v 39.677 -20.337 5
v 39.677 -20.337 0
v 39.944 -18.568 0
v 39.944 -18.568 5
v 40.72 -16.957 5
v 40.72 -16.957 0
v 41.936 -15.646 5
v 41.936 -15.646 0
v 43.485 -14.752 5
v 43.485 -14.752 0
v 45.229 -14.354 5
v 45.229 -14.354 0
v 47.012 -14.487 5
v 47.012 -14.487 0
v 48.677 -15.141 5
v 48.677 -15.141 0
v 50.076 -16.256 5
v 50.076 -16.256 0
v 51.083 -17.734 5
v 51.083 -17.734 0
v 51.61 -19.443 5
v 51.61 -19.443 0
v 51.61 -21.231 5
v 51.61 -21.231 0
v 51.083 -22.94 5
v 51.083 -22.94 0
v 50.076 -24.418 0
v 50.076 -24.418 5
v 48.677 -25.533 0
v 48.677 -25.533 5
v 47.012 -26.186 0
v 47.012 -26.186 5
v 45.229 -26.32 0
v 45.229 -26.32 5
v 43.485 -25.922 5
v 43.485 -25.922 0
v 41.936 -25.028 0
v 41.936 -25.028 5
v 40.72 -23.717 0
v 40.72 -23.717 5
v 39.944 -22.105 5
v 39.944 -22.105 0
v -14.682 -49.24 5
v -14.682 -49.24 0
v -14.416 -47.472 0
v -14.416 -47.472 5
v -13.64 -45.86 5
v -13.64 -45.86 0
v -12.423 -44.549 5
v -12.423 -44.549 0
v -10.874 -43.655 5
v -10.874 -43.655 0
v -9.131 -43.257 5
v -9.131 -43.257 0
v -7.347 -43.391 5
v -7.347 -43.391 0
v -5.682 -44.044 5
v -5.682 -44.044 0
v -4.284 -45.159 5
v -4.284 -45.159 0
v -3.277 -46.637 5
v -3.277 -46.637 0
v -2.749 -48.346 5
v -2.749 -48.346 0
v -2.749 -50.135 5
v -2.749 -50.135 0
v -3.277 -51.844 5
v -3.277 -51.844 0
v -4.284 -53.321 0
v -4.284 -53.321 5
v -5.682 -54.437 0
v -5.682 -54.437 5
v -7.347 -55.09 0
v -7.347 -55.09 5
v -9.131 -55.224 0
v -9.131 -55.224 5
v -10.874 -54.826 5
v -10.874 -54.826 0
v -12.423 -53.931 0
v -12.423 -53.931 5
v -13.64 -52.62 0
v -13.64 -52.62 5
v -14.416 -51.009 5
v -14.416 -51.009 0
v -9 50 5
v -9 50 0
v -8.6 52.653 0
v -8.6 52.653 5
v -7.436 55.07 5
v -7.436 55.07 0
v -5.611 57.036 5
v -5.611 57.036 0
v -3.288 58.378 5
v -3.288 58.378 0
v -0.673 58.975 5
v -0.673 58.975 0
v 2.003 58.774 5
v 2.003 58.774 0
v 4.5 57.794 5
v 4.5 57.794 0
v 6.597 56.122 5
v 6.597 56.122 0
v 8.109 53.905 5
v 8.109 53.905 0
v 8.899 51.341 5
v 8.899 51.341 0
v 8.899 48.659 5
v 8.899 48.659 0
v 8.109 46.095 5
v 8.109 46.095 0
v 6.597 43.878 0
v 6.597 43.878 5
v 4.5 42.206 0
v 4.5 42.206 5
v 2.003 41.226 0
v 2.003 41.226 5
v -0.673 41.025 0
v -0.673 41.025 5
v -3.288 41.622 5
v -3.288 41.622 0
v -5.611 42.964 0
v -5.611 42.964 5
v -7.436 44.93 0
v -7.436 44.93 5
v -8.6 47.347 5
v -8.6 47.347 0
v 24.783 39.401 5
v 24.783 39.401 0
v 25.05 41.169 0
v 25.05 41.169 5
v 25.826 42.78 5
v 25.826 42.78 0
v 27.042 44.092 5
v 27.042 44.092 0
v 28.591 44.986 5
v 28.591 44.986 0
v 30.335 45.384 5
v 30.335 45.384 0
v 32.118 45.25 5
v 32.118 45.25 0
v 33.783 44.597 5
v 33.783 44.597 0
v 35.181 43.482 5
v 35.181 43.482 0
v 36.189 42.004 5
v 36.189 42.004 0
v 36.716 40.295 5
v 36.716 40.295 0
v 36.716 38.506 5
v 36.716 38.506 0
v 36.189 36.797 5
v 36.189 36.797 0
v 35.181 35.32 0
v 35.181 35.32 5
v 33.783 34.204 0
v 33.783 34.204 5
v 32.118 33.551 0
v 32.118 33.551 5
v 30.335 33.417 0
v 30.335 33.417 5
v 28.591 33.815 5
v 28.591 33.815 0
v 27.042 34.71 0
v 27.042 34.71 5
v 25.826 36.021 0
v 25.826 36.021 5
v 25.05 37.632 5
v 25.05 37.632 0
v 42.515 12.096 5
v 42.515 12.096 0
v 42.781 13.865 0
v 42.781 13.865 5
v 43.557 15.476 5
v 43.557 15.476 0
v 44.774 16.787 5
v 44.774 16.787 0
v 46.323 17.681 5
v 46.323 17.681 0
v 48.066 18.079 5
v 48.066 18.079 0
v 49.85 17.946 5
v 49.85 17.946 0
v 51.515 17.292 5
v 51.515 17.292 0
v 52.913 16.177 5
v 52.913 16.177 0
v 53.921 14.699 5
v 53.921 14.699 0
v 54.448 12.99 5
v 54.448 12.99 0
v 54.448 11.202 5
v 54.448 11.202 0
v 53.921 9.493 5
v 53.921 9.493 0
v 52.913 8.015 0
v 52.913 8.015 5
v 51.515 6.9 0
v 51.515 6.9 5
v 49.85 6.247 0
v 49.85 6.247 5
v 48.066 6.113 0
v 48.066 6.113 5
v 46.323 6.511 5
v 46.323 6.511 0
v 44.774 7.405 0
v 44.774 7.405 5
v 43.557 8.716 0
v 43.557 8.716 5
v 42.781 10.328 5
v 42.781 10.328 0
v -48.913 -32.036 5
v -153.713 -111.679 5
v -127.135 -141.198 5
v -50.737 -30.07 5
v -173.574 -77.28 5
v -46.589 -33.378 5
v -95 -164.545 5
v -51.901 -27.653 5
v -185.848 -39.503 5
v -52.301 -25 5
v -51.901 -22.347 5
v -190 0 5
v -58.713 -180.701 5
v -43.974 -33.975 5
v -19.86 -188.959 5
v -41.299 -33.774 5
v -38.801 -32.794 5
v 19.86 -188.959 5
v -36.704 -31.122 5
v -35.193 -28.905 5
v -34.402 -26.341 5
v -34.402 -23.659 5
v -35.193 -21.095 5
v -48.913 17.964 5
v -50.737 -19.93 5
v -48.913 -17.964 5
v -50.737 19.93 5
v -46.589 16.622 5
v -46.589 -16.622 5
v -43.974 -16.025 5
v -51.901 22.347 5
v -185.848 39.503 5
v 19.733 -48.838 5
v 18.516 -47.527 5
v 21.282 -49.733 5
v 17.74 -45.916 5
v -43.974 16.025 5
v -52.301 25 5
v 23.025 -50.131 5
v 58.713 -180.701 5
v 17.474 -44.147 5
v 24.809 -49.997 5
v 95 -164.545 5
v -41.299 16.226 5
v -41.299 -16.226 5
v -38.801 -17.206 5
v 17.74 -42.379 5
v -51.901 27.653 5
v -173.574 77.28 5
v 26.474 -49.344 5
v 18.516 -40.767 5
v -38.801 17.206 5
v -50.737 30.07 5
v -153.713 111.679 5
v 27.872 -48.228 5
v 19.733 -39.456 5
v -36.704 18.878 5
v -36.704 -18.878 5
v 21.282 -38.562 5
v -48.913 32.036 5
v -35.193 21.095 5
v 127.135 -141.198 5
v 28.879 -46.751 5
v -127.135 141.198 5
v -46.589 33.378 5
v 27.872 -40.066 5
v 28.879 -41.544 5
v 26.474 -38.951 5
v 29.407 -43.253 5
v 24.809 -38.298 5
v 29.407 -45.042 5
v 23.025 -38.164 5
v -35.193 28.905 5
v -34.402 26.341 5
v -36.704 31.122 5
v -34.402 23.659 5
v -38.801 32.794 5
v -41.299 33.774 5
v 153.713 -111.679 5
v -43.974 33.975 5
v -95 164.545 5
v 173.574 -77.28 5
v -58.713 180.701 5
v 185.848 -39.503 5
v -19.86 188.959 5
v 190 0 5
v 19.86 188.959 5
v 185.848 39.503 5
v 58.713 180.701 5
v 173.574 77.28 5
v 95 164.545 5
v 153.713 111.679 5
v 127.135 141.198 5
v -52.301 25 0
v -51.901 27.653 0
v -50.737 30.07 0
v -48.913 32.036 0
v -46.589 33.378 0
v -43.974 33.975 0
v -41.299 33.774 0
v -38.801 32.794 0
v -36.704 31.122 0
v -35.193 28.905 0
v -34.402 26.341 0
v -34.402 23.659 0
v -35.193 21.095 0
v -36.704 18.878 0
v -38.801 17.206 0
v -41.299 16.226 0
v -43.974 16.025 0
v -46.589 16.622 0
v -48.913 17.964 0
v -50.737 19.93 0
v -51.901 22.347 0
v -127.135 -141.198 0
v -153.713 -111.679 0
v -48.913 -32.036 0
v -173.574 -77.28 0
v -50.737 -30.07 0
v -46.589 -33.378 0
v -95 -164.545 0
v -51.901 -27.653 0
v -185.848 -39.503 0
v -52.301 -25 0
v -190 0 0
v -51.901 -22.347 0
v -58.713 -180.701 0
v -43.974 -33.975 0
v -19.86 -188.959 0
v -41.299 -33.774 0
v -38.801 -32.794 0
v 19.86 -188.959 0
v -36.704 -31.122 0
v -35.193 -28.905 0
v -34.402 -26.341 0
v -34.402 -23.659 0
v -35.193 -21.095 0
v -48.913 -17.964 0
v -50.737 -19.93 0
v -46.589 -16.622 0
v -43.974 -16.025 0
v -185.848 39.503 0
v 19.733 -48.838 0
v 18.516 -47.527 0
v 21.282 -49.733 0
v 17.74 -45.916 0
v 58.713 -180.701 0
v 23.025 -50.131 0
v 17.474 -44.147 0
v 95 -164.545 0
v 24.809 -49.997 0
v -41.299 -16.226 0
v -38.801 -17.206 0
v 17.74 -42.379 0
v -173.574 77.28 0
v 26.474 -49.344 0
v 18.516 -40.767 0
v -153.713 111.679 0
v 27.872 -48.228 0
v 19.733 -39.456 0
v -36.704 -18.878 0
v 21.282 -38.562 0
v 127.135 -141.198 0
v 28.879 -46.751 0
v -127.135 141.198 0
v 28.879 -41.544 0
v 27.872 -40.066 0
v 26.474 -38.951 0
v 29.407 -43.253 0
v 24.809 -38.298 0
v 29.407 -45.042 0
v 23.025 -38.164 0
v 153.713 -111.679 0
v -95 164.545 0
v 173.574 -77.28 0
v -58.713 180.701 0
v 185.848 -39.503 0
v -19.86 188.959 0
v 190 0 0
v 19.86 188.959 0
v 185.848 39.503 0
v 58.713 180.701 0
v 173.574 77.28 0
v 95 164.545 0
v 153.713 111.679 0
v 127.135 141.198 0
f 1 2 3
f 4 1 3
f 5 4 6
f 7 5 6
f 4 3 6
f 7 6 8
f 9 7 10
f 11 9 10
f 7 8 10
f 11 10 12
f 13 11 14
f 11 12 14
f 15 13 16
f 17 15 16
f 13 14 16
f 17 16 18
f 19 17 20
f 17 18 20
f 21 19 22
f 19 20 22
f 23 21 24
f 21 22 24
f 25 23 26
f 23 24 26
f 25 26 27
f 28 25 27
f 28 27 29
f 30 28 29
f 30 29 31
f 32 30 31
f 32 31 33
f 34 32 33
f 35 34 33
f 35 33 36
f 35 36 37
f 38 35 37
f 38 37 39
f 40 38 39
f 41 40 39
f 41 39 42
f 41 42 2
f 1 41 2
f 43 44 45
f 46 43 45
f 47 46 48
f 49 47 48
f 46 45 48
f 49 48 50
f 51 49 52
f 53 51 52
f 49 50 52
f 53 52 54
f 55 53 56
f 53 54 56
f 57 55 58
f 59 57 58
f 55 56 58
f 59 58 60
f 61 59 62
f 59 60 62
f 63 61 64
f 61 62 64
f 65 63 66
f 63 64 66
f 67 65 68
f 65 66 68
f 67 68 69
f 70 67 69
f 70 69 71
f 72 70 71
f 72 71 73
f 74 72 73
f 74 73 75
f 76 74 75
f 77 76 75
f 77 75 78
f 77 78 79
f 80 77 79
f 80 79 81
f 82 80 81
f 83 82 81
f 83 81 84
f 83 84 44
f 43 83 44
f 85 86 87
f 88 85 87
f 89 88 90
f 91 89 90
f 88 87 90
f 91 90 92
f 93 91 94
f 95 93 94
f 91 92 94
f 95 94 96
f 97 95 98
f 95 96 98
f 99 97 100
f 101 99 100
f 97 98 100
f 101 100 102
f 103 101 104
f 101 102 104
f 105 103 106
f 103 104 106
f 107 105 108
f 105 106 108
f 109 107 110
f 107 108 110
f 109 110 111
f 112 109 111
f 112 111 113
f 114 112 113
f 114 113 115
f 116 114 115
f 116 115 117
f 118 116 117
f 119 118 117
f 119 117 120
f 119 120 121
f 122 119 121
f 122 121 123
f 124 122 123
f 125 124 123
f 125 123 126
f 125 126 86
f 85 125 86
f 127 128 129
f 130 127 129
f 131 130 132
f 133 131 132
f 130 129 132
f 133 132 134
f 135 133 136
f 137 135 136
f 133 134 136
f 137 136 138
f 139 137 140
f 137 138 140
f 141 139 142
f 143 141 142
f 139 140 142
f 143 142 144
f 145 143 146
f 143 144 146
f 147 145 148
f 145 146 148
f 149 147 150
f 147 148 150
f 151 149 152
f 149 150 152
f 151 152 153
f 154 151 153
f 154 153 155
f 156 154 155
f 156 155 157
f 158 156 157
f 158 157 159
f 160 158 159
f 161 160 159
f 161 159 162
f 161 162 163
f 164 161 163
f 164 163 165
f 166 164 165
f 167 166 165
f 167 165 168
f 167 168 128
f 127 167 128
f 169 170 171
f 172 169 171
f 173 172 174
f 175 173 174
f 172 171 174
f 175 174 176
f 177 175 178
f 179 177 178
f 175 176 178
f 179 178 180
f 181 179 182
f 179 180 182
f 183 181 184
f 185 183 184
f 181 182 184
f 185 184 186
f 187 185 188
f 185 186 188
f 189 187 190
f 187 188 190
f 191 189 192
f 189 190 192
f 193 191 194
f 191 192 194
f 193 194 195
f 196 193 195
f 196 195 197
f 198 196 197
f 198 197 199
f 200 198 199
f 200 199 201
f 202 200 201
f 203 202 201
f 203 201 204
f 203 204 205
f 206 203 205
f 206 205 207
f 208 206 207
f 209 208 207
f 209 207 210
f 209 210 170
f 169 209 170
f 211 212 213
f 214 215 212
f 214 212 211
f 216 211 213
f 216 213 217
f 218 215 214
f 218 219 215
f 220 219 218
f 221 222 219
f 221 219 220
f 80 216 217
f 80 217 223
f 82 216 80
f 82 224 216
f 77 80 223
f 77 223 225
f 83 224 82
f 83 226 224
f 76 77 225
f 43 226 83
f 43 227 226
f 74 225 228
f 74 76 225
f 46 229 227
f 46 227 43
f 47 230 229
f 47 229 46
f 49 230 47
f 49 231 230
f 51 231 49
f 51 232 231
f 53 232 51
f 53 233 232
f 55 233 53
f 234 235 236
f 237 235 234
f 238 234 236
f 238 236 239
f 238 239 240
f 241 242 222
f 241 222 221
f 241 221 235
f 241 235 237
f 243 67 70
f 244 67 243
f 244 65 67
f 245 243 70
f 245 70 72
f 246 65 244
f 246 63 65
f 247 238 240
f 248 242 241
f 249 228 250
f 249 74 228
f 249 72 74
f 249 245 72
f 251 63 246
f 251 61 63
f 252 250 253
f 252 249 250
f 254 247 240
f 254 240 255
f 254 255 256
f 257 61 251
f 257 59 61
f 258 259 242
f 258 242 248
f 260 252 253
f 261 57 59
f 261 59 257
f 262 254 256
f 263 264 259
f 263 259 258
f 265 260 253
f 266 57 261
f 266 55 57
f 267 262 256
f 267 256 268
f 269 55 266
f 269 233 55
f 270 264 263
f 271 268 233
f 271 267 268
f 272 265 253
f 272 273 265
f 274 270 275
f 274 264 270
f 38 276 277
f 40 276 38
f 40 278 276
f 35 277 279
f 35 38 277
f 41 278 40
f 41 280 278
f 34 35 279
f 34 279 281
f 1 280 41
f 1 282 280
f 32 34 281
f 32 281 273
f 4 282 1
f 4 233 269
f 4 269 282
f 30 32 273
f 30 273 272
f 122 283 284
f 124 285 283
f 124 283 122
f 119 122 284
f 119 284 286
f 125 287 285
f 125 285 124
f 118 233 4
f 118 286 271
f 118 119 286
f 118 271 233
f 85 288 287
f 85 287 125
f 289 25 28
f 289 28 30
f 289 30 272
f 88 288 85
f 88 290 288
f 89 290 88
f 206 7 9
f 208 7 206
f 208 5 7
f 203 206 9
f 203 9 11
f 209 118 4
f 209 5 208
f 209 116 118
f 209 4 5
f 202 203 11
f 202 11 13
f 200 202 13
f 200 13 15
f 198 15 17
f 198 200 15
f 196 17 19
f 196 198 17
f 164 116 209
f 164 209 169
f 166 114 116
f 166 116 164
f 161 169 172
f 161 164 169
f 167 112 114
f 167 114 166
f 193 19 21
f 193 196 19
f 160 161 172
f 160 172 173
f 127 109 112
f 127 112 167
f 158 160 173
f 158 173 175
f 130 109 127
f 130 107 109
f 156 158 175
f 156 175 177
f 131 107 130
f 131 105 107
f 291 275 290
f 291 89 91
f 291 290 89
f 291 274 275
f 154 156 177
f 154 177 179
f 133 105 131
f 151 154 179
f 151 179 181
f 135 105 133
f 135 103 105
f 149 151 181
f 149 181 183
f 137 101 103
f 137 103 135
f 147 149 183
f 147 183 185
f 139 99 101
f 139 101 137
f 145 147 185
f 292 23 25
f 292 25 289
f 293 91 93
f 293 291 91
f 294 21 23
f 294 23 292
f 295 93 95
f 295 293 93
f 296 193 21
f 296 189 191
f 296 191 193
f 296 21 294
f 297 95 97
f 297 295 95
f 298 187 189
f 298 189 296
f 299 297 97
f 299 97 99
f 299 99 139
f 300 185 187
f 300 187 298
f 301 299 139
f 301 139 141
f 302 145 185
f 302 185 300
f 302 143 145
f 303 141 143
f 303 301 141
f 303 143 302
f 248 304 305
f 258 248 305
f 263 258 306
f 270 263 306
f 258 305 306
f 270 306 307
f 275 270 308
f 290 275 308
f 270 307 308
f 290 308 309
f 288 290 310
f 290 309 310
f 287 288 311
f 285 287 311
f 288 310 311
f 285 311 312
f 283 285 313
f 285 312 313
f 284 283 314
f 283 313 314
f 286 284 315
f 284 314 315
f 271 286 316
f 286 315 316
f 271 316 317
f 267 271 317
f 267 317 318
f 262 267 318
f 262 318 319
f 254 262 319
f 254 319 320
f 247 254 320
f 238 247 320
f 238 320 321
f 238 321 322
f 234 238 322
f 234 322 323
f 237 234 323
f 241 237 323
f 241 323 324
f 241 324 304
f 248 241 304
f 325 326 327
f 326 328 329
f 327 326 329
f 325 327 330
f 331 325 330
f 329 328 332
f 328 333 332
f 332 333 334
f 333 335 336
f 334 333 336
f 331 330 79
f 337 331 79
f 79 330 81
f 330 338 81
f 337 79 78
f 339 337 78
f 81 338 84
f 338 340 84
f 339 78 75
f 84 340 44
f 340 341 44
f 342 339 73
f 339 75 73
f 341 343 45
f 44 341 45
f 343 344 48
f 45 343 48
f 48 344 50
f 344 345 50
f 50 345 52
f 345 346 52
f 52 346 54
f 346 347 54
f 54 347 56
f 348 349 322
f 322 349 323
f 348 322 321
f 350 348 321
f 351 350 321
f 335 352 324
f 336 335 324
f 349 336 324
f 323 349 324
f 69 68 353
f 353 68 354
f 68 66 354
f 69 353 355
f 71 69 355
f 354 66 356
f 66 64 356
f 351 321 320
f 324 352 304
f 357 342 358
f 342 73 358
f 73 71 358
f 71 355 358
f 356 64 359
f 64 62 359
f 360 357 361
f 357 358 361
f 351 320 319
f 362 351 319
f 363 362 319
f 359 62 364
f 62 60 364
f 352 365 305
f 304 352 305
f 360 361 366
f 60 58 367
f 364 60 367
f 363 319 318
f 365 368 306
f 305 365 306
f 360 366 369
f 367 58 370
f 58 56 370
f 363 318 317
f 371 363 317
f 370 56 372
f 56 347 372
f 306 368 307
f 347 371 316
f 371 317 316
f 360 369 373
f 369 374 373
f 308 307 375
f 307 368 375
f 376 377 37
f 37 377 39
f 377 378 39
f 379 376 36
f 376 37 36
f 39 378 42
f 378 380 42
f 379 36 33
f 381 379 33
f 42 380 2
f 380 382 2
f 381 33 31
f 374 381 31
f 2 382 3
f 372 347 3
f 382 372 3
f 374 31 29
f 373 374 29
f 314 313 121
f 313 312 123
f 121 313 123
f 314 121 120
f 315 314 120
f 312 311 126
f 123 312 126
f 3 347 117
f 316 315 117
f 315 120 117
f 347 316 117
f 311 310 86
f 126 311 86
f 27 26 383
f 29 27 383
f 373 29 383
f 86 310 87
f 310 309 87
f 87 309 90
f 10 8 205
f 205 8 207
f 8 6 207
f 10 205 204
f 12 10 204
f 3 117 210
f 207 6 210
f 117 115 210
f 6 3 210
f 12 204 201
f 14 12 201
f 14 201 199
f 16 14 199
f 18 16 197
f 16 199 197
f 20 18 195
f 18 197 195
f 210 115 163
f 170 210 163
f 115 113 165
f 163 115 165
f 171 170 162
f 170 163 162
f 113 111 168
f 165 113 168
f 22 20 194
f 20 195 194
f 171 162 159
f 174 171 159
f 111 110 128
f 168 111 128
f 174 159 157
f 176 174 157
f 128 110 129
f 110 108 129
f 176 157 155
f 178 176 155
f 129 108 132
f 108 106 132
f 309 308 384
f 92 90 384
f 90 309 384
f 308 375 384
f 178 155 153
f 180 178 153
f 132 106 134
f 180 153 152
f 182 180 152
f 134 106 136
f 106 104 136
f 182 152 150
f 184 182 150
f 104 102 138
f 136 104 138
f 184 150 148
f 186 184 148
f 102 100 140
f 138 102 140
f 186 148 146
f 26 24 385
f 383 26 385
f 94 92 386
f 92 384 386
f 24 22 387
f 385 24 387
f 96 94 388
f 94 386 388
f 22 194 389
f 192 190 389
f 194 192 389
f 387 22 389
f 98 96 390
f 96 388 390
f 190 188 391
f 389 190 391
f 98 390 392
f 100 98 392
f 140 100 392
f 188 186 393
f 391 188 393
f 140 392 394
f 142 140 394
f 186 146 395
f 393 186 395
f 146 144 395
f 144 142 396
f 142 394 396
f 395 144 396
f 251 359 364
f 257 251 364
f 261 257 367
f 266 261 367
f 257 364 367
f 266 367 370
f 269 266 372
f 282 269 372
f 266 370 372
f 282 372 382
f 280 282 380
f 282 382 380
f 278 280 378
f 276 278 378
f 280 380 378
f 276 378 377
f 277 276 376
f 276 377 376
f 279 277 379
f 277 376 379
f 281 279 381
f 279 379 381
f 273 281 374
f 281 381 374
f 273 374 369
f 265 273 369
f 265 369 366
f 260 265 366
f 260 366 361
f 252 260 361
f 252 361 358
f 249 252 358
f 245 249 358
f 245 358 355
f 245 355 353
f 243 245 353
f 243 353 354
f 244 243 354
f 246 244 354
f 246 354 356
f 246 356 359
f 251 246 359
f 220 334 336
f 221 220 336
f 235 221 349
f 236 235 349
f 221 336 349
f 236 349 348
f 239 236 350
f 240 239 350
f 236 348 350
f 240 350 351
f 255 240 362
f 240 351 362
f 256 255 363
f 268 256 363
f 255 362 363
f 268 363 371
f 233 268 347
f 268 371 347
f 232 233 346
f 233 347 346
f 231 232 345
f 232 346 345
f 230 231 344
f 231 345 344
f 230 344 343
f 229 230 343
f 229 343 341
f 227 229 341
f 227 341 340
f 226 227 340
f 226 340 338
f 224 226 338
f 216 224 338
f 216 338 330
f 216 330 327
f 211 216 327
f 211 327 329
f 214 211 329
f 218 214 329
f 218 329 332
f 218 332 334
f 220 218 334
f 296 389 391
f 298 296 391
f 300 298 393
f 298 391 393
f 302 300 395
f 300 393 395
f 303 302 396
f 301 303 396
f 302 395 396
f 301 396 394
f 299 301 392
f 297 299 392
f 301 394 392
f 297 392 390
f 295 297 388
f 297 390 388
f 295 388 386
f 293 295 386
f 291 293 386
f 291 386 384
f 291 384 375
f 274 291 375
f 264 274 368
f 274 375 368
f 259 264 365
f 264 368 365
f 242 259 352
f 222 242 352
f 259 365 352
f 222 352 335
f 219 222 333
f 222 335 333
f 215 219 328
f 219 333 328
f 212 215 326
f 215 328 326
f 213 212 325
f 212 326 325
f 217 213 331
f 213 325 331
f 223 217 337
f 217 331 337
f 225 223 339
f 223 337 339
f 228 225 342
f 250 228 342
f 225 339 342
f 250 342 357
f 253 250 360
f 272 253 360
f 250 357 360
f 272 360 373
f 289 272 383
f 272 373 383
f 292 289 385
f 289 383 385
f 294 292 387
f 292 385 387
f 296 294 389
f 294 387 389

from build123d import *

# Parameters (mm, degrees)
SKETCH1_R           = 190
BOSS_EXTRUDE1_DEPTH = 5
SKETCH2_R           = 9
SKETCH2_R_2         = 6
CUT_EXTRUDE1_DEPTH  = 10


with BuildPart() as part:
    # Sketch1 → Boss-Extrude1 (new body)
    with BuildSketch(Plane.XY):
        Circle(SKETCH1_R)
    extrude(amount=BOSS_EXTRUDE1_DEPTH)

    # Sketch2 → Cut-Extrude1 (cut)
    with BuildSketch(Plane(origin=(0, 0, 0), x_dir=(-1, 0, 0), z_dir=(0, 0, -1))):
        with Locations((0, 50)):
            Circle(SKETCH2_R)
        with Locations((43.301270189, 25)):
            Circle(SKETCH2_R)
        with Locations((43.301270189, -25)):
            Circle(SKETCH2_R)
        with Locations((-30.783073766, 39.40053768)):
            Circle(SKETCH2_R_2)
        with Locations((-48.514786314, 12.09609478)):
            Circle(SKETCH2_R_2)
        with Locations((-45.677272882, -20.336832154)):
            Circle(SKETCH2_R_2)
        with Locations((-23.473578139, -44.147379643)):
            Circle(SKETCH2_R_2)
        with Locations((8.682408883, -49.240387651)):
            Circle(SKETCH2_R_2)
    extrude(amount=-CUT_EXTRUDE1_DEPTH, mode=Mode.SUBTRACT)


solid = part.part
